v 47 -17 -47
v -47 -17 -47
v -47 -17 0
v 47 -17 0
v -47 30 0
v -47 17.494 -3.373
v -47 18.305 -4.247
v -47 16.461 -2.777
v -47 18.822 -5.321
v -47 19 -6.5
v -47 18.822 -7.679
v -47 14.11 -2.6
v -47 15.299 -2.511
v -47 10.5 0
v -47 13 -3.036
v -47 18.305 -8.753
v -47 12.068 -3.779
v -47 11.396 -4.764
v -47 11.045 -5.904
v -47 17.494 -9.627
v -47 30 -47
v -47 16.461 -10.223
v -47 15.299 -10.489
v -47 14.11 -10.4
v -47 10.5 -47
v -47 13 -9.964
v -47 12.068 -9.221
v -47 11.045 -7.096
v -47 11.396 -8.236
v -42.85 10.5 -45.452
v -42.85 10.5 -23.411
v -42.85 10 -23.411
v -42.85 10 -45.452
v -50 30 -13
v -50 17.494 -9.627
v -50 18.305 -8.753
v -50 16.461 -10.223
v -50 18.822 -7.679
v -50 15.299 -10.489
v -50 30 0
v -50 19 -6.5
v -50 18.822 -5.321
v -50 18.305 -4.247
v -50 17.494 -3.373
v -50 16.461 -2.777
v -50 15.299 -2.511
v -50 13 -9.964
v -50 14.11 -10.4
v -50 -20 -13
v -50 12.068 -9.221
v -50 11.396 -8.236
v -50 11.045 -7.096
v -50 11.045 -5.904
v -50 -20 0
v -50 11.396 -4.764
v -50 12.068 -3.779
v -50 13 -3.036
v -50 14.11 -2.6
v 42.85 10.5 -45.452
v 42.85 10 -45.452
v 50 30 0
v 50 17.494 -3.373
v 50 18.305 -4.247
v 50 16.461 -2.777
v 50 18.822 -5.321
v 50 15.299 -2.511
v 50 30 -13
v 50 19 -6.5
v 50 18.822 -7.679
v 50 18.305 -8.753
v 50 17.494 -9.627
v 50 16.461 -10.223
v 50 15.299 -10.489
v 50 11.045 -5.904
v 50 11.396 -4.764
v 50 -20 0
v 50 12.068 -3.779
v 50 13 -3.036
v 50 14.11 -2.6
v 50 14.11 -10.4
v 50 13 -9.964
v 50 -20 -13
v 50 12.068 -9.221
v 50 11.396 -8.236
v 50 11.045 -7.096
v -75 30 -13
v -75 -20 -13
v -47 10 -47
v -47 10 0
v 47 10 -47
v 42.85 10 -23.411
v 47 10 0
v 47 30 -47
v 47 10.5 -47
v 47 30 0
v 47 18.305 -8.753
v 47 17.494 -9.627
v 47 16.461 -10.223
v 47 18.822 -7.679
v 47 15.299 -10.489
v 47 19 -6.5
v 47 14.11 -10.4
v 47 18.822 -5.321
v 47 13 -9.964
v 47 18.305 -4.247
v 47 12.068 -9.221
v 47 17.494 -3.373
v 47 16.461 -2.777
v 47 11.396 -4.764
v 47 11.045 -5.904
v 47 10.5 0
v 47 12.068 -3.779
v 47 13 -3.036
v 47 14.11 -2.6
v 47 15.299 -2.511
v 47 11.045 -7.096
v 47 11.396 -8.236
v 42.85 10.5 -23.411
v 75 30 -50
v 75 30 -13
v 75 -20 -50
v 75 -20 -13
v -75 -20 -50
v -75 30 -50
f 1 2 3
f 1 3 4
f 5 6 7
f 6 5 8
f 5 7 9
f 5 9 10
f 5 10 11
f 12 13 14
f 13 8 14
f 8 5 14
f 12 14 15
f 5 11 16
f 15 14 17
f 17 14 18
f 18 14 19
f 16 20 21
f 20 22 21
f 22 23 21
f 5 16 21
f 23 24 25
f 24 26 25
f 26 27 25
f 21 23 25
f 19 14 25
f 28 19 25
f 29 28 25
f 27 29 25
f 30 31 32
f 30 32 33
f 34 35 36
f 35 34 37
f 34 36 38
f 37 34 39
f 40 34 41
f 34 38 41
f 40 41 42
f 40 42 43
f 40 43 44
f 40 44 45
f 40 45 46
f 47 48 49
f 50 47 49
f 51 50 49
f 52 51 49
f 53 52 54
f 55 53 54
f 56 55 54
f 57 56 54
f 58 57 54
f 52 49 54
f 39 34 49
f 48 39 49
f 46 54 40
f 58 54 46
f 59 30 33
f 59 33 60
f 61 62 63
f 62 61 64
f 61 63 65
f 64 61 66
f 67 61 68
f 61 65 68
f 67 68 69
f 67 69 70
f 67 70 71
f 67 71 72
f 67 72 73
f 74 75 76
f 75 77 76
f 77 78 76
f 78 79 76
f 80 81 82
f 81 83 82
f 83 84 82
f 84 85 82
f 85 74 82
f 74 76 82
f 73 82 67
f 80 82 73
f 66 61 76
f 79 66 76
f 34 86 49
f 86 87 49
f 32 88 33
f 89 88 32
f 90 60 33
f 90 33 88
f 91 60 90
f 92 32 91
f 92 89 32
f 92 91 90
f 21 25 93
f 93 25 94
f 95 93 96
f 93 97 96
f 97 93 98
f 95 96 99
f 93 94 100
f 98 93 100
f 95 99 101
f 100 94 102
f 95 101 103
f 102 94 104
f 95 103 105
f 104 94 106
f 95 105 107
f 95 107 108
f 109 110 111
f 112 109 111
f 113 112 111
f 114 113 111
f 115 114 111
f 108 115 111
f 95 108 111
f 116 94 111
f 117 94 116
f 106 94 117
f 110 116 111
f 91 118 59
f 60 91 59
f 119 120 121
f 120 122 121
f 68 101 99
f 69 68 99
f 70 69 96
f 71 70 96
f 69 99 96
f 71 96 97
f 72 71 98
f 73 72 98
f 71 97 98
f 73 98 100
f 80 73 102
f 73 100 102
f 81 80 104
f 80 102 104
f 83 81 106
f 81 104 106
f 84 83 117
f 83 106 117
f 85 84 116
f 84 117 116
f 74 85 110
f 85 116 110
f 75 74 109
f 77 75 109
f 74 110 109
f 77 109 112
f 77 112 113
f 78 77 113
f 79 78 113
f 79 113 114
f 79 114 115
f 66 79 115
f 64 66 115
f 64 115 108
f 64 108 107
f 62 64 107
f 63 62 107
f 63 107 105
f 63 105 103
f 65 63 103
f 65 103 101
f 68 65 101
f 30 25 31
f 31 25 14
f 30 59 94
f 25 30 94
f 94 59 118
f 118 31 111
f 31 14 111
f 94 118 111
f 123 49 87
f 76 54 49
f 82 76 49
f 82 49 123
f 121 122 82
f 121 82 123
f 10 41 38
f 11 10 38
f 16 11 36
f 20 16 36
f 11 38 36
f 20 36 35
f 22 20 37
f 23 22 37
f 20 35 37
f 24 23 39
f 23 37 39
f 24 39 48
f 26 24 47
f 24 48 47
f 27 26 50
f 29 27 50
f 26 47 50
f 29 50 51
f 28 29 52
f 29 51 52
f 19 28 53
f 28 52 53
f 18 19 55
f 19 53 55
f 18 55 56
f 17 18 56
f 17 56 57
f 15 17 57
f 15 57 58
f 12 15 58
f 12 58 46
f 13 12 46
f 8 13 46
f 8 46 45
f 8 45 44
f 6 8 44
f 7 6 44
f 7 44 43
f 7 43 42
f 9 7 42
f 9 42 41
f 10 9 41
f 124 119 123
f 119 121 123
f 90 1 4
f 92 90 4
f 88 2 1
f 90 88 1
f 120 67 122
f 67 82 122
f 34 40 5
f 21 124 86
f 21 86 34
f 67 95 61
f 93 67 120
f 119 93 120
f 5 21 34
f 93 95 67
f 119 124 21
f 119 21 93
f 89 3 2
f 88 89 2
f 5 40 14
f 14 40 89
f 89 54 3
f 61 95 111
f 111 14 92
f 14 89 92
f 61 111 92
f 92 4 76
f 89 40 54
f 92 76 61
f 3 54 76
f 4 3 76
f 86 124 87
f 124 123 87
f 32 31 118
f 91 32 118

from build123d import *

# Parameters (mm, degrees)
SKETCH1_W           = 100
SKETCH1_H           = 40
BOSS_EXTRUDE1_DEPTH = 50
SKETCH2_W           = 94
SKETCH2_H           = 47
CUT_EXTRUDE1_DEPTH  = 37
SKETCH3_W           = 37
SKETCH3_H           = 40
BOSS_EXTRUDE2_DEPTH = 25
SKETCH4_R           = 4
CUT_EXTRUDE2_DEPTH  = 137.106575888
BOSS_EXTRUDE3_DEPTH = 10
BOSS_EXTRUDE4_REACH = 97
SKETCH7_W           = 94
SKETCH7_H           = 0.5
CUT_EXTRUDE3_REACH  = 97.159
SKETCH8_W           = 85.699881722
SKETCH8_H           = 22.040366035


with BuildPart() as part:
    # Sketch1 → Boss-Extrude1 (new body)
    with BuildSketch(Plane.XY):
        Rectangle(SKETCH1_W, SKETCH1_H)
    extrude(amount=-BOSS_EXTRUDE1_DEPTH)

    # Sketch2 → Cut-Extrude1 (cut)
    with BuildSketch(Plane(origin=(0, 20, 0), x_dir=(1, 0, 0), z_dir=(0, 1, 0))):
        with Locations((0, 23.5)):
            Rectangle(SKETCH2_W, SKETCH2_H)
    extrude(amount=-CUT_EXTRUDE1_DEPTH, mode=Mode.SUBTRACT)

    # Sketch3 → Boss-Extrude2 (add)
    with BuildSketch(Plane(origin=(50, 0, 0), x_dir=(0, 0, -1), z_dir=(1, 0, 0))):
        with Locations((31.5, 0)):
            Rectangle(SKETCH3_W, SKETCH3_H)
    boss_extrude2 = extrude(amount=BOSS_EXTRUDE2_DEPTH)

    # Mirror2: Boss-Extrude2 across plane
    add(boss_extrude2.mirror(Plane.ZY))

    # Sketch4 → Cut-Extrude2 (cut, through all)
    with BuildSketch(Plane.ZY.offset(50)):
        with Locations(Location((-6.5, 15, 0), (0, 0, 90))):
            Circle(SKETCH4_R)
    extrude(amount=-CUT_EXTRUDE2_DEPTH, mode=Mode.SUBTRACT)

    # Sketch6 → Boss-Extrude3 (add)
    with BuildSketch(Plane(origin=(0, 20, 0), x_dir=(1, 0, 0), z_dir=(0, 1, 0))):
        Polygon((-47, 0), (-47, 47), (47, 47), (47, 0), (50, 0), (50, 13), (75, 13), (75, 50), (-75, 50), (-75, 13), (-50, 13), (-50, 0), align=None)
    extrude(amount=BOSS_EXTRUDE3_DEPTH)

    # Sketch7 → Boss-Extrude4 (add, up to next)
    with BuildSketch(Plane.XY, mode=Mode.PRIVATE) as boss_extrude4_sk1:
        with Locations((0, 10.25)):
            Rectangle(SKETCH7_W, SKETCH7_H)
    boss_extrude4_tool1 = extrude(boss_extrude4_sk1.sketch, amount=-BOSS_EXTRUDE4_REACH, mode=Mode.PRIVATE) - part.part
    add(boss_extrude4_tool1.solids().sort_by_distance((0, 10.25, 0))[0])

    # Sketch8 → Cut-Extrude3 (cut, up to next)
    with BuildSketch(Plane(origin=(0, 10.5, 0), x_dir=(1, 0, 0), z_dir=(0, 1, 0)), mode=Mode.PRIVATE) as cut_extrude3_sk1:
        with Locations((0, 34.43157355)):
            Rectangle(SKETCH8_W, SKETCH8_H)
    cut_extrude3_tool1 = extrude(cut_extrude3_sk1.sketch, amount=-CUT_EXTRUDE3_REACH, mode=Mode.PRIVATE) & part.part
    add(cut_extrude3_tool1.solids().sort_by_distance((0, 10.5, -34.431574))[0], mode=Mode.SUBTRACT)


solid = part.part
